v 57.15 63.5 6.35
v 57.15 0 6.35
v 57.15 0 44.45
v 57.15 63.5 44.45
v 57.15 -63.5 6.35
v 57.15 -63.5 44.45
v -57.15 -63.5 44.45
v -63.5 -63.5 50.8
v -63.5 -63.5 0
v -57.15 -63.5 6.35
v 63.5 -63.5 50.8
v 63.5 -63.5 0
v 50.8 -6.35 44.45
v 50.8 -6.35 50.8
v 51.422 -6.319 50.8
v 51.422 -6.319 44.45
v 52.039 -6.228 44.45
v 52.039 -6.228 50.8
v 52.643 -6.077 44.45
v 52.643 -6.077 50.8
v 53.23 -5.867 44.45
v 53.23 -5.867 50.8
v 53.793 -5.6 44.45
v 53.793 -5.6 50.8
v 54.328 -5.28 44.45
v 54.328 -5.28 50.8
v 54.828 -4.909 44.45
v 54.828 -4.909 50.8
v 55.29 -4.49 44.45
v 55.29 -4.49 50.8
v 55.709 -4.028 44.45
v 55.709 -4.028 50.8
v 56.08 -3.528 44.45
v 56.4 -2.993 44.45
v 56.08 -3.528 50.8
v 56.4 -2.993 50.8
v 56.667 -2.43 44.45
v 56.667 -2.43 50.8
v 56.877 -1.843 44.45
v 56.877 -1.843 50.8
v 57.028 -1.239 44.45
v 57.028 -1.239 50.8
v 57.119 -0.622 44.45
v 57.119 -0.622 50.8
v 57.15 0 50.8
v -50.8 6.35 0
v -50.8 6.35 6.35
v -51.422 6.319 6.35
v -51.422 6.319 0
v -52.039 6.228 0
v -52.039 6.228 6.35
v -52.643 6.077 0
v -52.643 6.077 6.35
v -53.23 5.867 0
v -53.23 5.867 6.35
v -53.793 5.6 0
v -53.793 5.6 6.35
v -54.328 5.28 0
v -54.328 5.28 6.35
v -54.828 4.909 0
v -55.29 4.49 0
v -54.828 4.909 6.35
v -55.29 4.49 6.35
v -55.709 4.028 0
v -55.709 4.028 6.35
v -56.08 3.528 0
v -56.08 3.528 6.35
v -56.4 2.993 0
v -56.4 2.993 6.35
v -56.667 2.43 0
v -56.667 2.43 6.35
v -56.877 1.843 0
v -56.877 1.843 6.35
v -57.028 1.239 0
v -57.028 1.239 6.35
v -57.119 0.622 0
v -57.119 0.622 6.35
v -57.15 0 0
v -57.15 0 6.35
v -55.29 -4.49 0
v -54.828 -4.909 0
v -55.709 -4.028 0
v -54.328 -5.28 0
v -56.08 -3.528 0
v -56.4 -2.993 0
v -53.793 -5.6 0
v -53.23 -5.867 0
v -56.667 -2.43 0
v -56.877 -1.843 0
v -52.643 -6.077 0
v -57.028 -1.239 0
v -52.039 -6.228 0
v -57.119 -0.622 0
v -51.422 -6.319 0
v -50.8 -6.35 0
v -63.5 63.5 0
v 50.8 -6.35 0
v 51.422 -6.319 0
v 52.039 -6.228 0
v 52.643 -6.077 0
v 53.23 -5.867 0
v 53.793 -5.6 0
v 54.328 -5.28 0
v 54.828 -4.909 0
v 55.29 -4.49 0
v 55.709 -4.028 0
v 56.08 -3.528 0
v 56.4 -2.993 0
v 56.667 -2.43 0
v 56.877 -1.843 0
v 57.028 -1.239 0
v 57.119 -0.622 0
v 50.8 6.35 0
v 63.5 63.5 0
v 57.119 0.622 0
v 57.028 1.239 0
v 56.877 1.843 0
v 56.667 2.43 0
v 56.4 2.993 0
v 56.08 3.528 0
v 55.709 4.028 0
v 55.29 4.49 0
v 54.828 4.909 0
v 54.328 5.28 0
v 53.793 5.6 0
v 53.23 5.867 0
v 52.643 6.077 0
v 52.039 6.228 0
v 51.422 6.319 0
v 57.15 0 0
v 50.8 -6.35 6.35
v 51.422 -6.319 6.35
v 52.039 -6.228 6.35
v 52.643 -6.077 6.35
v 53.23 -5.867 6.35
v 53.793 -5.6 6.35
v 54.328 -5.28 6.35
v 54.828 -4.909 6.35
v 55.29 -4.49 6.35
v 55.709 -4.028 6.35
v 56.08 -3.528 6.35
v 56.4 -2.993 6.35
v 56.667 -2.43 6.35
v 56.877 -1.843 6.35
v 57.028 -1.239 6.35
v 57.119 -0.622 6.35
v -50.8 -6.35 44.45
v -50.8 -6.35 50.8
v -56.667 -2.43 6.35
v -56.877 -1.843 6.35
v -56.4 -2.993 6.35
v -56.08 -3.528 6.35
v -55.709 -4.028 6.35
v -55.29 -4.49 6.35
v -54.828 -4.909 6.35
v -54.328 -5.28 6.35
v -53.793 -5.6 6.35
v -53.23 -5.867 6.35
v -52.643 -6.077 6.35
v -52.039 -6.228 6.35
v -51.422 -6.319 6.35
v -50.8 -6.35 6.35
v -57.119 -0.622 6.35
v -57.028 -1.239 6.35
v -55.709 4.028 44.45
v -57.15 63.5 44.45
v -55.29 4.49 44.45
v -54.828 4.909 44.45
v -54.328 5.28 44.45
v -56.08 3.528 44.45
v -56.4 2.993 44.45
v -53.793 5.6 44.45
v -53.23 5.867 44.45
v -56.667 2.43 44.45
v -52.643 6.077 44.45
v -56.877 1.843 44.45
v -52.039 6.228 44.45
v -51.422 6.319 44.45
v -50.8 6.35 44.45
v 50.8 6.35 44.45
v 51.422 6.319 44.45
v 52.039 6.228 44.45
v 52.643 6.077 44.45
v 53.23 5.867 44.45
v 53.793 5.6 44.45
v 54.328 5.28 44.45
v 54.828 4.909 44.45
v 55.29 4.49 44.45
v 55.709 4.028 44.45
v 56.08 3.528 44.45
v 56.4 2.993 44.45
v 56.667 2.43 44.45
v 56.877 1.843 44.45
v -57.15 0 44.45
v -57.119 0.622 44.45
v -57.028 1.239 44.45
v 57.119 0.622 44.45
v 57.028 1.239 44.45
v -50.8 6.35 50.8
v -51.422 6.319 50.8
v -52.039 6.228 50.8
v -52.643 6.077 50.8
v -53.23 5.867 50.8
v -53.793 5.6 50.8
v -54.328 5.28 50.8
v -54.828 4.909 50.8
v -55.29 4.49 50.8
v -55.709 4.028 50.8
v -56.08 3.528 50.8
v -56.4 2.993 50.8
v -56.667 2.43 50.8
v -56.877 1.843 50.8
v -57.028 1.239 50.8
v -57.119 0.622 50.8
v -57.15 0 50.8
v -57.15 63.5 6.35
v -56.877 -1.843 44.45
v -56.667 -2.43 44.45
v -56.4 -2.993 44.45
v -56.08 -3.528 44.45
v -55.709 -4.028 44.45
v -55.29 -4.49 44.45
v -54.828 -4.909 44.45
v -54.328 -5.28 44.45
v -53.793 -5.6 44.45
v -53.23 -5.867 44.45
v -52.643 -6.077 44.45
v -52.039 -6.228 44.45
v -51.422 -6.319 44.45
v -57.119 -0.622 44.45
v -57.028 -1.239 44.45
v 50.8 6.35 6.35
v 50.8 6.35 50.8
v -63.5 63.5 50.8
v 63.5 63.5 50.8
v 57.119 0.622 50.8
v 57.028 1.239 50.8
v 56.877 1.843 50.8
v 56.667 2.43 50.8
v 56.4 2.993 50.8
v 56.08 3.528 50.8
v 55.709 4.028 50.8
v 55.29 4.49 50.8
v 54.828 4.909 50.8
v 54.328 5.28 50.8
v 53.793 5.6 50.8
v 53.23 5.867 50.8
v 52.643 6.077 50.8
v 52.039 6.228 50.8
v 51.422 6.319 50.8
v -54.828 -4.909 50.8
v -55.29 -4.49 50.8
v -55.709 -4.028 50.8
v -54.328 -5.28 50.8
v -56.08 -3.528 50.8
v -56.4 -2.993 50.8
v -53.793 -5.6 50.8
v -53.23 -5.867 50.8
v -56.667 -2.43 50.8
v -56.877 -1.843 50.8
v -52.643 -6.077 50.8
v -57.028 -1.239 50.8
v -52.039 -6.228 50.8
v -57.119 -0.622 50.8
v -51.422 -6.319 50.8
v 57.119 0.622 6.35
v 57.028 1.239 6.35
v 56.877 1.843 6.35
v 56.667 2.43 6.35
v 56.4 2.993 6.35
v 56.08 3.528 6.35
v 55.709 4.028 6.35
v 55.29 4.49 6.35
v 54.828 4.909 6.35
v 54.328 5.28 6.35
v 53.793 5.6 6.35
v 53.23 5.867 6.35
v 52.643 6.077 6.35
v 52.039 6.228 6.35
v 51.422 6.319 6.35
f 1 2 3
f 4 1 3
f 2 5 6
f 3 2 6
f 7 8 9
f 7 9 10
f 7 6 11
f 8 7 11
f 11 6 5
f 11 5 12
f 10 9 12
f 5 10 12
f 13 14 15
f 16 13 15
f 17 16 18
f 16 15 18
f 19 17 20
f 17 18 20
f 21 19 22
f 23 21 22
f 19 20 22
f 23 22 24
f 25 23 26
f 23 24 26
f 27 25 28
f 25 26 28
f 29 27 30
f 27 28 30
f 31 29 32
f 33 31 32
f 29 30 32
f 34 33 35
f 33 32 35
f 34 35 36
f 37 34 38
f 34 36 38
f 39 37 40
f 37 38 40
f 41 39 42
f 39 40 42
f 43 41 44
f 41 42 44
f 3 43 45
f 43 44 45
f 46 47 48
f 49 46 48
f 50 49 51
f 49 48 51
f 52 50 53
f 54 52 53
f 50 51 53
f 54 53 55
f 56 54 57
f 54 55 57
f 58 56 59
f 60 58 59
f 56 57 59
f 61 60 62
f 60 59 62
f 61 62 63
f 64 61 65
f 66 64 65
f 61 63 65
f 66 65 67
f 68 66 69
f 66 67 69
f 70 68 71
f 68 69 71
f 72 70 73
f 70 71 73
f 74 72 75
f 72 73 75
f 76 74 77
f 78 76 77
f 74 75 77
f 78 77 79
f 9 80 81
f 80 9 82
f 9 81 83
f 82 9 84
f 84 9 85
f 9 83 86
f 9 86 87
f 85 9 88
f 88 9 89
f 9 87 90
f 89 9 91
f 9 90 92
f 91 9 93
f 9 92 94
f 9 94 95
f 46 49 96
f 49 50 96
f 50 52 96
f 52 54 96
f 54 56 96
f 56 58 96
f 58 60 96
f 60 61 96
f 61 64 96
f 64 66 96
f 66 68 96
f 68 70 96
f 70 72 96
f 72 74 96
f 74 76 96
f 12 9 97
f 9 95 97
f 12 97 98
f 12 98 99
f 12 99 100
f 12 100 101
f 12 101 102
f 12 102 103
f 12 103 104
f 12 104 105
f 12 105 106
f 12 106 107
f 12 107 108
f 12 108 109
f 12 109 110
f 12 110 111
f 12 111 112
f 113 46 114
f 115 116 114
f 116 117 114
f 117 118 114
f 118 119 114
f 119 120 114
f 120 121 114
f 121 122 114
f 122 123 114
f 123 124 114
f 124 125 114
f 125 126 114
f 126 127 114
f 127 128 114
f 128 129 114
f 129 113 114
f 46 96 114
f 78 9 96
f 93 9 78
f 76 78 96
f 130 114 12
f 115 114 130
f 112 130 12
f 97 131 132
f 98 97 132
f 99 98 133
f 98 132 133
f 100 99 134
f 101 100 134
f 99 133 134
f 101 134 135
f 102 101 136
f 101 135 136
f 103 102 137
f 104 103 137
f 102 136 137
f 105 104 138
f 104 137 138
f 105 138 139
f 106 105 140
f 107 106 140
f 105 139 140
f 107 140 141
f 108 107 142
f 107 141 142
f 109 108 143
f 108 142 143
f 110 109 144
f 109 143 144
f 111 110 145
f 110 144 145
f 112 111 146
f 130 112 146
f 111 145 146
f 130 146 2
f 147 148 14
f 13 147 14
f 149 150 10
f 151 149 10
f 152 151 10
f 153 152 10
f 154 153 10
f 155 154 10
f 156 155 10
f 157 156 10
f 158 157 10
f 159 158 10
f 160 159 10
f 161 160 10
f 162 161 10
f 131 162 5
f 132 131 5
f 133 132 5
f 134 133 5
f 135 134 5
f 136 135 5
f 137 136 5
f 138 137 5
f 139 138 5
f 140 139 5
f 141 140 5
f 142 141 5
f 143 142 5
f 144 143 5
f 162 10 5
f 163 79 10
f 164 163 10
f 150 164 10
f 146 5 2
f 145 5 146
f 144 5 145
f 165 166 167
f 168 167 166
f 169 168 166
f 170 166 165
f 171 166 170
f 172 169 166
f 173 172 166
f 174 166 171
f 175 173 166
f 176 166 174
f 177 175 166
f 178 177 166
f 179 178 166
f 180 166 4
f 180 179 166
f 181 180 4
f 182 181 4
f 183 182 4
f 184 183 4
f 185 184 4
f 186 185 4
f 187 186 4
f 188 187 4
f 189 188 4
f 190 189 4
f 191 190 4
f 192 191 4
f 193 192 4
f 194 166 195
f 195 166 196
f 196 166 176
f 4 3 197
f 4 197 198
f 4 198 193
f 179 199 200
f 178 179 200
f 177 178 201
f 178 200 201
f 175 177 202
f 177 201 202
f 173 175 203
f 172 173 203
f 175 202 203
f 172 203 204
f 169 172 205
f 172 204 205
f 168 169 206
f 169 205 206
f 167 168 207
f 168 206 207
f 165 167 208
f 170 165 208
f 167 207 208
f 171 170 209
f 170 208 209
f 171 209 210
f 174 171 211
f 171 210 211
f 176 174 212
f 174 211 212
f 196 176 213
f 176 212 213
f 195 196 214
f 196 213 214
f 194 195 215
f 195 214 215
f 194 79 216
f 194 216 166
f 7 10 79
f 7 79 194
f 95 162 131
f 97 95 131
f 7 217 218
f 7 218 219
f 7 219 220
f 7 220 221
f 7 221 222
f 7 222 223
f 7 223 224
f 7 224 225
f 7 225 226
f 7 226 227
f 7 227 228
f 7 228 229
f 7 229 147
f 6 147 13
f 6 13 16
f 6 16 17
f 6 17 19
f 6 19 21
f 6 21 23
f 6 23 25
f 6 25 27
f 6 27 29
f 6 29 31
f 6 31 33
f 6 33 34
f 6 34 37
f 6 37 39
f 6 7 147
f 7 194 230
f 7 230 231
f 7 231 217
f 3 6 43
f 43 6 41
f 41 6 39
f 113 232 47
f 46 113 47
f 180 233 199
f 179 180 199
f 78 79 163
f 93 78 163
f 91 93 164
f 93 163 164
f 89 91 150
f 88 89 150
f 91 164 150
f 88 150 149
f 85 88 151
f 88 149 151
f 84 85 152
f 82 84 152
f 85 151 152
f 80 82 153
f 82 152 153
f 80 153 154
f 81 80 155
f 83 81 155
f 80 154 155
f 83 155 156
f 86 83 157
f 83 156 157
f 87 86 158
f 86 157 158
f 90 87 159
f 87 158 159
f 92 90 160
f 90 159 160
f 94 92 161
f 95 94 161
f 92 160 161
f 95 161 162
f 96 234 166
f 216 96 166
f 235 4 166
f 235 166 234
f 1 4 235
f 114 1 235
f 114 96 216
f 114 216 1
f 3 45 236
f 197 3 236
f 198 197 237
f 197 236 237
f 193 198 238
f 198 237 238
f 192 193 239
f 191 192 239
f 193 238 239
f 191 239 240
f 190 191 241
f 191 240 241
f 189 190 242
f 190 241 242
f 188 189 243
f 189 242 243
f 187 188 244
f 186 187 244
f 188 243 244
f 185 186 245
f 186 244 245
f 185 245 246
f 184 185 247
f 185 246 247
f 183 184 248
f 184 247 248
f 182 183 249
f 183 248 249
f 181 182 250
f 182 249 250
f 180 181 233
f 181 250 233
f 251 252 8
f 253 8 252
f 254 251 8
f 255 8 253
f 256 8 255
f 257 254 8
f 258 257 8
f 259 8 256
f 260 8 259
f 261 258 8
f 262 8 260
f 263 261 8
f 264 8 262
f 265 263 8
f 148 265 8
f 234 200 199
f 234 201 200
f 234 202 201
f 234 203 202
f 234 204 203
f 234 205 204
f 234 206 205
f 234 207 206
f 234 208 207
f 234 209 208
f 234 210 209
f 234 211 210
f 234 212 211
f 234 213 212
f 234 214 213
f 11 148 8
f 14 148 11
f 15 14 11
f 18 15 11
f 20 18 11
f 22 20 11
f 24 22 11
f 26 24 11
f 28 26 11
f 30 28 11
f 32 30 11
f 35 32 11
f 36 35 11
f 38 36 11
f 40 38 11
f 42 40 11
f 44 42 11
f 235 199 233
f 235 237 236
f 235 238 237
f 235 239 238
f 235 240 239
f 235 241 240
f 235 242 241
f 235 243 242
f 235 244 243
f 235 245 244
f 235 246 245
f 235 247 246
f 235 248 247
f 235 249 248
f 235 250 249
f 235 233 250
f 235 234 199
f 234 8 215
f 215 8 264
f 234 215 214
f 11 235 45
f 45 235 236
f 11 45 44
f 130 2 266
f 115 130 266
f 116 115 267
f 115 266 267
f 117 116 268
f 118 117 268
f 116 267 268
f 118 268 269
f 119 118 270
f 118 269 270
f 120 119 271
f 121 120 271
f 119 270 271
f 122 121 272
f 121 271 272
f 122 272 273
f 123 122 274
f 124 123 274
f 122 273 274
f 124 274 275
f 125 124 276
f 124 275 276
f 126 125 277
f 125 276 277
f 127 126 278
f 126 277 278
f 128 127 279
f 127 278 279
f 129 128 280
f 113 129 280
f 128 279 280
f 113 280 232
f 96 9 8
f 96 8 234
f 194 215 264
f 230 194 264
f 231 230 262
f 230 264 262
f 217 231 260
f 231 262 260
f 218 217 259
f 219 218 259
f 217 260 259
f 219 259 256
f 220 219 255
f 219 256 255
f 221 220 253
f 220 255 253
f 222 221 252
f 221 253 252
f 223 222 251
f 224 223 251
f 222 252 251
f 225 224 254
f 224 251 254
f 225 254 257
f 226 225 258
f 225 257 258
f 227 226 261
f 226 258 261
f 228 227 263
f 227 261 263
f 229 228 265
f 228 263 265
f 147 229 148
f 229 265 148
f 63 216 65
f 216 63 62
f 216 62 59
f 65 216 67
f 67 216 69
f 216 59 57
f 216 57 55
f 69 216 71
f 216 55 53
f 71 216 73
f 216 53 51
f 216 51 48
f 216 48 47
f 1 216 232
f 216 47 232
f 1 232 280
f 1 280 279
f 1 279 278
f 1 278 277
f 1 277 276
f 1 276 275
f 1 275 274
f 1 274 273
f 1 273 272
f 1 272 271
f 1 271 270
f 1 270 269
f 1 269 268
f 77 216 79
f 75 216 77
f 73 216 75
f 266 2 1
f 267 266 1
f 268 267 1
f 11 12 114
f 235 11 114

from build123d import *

# Parameters (mm, degrees)
F0_W     = 127
F0_H     = 127
F1_DEPTH = 50.8
F2_W     = 114.3
F2_H     = 38.1
F3_DEPTH = 127.001
F5_DEPTH = 50.801


with BuildPart() as f1:
    # F0 (on Top) → F1 (new body)
    with BuildSketch(Plane.XY):
        Rectangle(F0_W, F0_H)
    extrude(amount=F1_DEPTH)

    # F2 (on face) → F3 (cut, through all)
    with BuildSketch(Plane.XZ.offset(63.5)):
        with Locations((0, 25.4)):
            Rectangle(F2_W, F2_H)
    extrude(amount=-F3_DEPTH, mode=Mode.SUBTRACT)

    # F4 (on face) → F5 (cut, through all)
    with BuildSketch(Plane.XY.offset(50.8)):
        with BuildLine():
            ThreePointArc((50.8, -6.35), (44.45, 0), (50.8, 6.35))
            Line((50.8, 6.35), (-50.8, 6.35))
            ThreePointArc((-50.8, 6.35), (-46.309872, 4.490128), (-44.45, 0))
            ThreePointArc((-44.45, 0), (-46.309872, -4.490128), (-50.8, -6.35))
            Line((-50.8, -6.35), (50.8, -6.35))
        make_face()
        with BuildLine():
            ThreePointArc((50.8, -6.35), (55.290128, -4.490128), (57.15, 0))
            ThreePointArc((57.15, 0), (55.290128, 4.490128), (50.8, 6.35))
            ThreePointArc((50.8, 6.35), (44.45, 0), (50.8, -6.35))
        make_face()
        with BuildLine():
            ThreePointArc((-44.45, 0), (-46.309872, 4.490128), (-50.8, 6.35))
            ThreePointArc((-50.8, 6.35), (-55.290128, 4.490128), (-57.15, 0))
            ThreePointArc((-57.15, 0), (-55.290128, -4.490128), (-50.8, -6.35))
            ThreePointArc((-50.8, -6.35), (-46.309872, -4.490128), (-44.45, 0))
        make_face()
    extrude(amount=-F5_DEPTH, mode=Mode.SUBTRACT)


solid = f1.part
